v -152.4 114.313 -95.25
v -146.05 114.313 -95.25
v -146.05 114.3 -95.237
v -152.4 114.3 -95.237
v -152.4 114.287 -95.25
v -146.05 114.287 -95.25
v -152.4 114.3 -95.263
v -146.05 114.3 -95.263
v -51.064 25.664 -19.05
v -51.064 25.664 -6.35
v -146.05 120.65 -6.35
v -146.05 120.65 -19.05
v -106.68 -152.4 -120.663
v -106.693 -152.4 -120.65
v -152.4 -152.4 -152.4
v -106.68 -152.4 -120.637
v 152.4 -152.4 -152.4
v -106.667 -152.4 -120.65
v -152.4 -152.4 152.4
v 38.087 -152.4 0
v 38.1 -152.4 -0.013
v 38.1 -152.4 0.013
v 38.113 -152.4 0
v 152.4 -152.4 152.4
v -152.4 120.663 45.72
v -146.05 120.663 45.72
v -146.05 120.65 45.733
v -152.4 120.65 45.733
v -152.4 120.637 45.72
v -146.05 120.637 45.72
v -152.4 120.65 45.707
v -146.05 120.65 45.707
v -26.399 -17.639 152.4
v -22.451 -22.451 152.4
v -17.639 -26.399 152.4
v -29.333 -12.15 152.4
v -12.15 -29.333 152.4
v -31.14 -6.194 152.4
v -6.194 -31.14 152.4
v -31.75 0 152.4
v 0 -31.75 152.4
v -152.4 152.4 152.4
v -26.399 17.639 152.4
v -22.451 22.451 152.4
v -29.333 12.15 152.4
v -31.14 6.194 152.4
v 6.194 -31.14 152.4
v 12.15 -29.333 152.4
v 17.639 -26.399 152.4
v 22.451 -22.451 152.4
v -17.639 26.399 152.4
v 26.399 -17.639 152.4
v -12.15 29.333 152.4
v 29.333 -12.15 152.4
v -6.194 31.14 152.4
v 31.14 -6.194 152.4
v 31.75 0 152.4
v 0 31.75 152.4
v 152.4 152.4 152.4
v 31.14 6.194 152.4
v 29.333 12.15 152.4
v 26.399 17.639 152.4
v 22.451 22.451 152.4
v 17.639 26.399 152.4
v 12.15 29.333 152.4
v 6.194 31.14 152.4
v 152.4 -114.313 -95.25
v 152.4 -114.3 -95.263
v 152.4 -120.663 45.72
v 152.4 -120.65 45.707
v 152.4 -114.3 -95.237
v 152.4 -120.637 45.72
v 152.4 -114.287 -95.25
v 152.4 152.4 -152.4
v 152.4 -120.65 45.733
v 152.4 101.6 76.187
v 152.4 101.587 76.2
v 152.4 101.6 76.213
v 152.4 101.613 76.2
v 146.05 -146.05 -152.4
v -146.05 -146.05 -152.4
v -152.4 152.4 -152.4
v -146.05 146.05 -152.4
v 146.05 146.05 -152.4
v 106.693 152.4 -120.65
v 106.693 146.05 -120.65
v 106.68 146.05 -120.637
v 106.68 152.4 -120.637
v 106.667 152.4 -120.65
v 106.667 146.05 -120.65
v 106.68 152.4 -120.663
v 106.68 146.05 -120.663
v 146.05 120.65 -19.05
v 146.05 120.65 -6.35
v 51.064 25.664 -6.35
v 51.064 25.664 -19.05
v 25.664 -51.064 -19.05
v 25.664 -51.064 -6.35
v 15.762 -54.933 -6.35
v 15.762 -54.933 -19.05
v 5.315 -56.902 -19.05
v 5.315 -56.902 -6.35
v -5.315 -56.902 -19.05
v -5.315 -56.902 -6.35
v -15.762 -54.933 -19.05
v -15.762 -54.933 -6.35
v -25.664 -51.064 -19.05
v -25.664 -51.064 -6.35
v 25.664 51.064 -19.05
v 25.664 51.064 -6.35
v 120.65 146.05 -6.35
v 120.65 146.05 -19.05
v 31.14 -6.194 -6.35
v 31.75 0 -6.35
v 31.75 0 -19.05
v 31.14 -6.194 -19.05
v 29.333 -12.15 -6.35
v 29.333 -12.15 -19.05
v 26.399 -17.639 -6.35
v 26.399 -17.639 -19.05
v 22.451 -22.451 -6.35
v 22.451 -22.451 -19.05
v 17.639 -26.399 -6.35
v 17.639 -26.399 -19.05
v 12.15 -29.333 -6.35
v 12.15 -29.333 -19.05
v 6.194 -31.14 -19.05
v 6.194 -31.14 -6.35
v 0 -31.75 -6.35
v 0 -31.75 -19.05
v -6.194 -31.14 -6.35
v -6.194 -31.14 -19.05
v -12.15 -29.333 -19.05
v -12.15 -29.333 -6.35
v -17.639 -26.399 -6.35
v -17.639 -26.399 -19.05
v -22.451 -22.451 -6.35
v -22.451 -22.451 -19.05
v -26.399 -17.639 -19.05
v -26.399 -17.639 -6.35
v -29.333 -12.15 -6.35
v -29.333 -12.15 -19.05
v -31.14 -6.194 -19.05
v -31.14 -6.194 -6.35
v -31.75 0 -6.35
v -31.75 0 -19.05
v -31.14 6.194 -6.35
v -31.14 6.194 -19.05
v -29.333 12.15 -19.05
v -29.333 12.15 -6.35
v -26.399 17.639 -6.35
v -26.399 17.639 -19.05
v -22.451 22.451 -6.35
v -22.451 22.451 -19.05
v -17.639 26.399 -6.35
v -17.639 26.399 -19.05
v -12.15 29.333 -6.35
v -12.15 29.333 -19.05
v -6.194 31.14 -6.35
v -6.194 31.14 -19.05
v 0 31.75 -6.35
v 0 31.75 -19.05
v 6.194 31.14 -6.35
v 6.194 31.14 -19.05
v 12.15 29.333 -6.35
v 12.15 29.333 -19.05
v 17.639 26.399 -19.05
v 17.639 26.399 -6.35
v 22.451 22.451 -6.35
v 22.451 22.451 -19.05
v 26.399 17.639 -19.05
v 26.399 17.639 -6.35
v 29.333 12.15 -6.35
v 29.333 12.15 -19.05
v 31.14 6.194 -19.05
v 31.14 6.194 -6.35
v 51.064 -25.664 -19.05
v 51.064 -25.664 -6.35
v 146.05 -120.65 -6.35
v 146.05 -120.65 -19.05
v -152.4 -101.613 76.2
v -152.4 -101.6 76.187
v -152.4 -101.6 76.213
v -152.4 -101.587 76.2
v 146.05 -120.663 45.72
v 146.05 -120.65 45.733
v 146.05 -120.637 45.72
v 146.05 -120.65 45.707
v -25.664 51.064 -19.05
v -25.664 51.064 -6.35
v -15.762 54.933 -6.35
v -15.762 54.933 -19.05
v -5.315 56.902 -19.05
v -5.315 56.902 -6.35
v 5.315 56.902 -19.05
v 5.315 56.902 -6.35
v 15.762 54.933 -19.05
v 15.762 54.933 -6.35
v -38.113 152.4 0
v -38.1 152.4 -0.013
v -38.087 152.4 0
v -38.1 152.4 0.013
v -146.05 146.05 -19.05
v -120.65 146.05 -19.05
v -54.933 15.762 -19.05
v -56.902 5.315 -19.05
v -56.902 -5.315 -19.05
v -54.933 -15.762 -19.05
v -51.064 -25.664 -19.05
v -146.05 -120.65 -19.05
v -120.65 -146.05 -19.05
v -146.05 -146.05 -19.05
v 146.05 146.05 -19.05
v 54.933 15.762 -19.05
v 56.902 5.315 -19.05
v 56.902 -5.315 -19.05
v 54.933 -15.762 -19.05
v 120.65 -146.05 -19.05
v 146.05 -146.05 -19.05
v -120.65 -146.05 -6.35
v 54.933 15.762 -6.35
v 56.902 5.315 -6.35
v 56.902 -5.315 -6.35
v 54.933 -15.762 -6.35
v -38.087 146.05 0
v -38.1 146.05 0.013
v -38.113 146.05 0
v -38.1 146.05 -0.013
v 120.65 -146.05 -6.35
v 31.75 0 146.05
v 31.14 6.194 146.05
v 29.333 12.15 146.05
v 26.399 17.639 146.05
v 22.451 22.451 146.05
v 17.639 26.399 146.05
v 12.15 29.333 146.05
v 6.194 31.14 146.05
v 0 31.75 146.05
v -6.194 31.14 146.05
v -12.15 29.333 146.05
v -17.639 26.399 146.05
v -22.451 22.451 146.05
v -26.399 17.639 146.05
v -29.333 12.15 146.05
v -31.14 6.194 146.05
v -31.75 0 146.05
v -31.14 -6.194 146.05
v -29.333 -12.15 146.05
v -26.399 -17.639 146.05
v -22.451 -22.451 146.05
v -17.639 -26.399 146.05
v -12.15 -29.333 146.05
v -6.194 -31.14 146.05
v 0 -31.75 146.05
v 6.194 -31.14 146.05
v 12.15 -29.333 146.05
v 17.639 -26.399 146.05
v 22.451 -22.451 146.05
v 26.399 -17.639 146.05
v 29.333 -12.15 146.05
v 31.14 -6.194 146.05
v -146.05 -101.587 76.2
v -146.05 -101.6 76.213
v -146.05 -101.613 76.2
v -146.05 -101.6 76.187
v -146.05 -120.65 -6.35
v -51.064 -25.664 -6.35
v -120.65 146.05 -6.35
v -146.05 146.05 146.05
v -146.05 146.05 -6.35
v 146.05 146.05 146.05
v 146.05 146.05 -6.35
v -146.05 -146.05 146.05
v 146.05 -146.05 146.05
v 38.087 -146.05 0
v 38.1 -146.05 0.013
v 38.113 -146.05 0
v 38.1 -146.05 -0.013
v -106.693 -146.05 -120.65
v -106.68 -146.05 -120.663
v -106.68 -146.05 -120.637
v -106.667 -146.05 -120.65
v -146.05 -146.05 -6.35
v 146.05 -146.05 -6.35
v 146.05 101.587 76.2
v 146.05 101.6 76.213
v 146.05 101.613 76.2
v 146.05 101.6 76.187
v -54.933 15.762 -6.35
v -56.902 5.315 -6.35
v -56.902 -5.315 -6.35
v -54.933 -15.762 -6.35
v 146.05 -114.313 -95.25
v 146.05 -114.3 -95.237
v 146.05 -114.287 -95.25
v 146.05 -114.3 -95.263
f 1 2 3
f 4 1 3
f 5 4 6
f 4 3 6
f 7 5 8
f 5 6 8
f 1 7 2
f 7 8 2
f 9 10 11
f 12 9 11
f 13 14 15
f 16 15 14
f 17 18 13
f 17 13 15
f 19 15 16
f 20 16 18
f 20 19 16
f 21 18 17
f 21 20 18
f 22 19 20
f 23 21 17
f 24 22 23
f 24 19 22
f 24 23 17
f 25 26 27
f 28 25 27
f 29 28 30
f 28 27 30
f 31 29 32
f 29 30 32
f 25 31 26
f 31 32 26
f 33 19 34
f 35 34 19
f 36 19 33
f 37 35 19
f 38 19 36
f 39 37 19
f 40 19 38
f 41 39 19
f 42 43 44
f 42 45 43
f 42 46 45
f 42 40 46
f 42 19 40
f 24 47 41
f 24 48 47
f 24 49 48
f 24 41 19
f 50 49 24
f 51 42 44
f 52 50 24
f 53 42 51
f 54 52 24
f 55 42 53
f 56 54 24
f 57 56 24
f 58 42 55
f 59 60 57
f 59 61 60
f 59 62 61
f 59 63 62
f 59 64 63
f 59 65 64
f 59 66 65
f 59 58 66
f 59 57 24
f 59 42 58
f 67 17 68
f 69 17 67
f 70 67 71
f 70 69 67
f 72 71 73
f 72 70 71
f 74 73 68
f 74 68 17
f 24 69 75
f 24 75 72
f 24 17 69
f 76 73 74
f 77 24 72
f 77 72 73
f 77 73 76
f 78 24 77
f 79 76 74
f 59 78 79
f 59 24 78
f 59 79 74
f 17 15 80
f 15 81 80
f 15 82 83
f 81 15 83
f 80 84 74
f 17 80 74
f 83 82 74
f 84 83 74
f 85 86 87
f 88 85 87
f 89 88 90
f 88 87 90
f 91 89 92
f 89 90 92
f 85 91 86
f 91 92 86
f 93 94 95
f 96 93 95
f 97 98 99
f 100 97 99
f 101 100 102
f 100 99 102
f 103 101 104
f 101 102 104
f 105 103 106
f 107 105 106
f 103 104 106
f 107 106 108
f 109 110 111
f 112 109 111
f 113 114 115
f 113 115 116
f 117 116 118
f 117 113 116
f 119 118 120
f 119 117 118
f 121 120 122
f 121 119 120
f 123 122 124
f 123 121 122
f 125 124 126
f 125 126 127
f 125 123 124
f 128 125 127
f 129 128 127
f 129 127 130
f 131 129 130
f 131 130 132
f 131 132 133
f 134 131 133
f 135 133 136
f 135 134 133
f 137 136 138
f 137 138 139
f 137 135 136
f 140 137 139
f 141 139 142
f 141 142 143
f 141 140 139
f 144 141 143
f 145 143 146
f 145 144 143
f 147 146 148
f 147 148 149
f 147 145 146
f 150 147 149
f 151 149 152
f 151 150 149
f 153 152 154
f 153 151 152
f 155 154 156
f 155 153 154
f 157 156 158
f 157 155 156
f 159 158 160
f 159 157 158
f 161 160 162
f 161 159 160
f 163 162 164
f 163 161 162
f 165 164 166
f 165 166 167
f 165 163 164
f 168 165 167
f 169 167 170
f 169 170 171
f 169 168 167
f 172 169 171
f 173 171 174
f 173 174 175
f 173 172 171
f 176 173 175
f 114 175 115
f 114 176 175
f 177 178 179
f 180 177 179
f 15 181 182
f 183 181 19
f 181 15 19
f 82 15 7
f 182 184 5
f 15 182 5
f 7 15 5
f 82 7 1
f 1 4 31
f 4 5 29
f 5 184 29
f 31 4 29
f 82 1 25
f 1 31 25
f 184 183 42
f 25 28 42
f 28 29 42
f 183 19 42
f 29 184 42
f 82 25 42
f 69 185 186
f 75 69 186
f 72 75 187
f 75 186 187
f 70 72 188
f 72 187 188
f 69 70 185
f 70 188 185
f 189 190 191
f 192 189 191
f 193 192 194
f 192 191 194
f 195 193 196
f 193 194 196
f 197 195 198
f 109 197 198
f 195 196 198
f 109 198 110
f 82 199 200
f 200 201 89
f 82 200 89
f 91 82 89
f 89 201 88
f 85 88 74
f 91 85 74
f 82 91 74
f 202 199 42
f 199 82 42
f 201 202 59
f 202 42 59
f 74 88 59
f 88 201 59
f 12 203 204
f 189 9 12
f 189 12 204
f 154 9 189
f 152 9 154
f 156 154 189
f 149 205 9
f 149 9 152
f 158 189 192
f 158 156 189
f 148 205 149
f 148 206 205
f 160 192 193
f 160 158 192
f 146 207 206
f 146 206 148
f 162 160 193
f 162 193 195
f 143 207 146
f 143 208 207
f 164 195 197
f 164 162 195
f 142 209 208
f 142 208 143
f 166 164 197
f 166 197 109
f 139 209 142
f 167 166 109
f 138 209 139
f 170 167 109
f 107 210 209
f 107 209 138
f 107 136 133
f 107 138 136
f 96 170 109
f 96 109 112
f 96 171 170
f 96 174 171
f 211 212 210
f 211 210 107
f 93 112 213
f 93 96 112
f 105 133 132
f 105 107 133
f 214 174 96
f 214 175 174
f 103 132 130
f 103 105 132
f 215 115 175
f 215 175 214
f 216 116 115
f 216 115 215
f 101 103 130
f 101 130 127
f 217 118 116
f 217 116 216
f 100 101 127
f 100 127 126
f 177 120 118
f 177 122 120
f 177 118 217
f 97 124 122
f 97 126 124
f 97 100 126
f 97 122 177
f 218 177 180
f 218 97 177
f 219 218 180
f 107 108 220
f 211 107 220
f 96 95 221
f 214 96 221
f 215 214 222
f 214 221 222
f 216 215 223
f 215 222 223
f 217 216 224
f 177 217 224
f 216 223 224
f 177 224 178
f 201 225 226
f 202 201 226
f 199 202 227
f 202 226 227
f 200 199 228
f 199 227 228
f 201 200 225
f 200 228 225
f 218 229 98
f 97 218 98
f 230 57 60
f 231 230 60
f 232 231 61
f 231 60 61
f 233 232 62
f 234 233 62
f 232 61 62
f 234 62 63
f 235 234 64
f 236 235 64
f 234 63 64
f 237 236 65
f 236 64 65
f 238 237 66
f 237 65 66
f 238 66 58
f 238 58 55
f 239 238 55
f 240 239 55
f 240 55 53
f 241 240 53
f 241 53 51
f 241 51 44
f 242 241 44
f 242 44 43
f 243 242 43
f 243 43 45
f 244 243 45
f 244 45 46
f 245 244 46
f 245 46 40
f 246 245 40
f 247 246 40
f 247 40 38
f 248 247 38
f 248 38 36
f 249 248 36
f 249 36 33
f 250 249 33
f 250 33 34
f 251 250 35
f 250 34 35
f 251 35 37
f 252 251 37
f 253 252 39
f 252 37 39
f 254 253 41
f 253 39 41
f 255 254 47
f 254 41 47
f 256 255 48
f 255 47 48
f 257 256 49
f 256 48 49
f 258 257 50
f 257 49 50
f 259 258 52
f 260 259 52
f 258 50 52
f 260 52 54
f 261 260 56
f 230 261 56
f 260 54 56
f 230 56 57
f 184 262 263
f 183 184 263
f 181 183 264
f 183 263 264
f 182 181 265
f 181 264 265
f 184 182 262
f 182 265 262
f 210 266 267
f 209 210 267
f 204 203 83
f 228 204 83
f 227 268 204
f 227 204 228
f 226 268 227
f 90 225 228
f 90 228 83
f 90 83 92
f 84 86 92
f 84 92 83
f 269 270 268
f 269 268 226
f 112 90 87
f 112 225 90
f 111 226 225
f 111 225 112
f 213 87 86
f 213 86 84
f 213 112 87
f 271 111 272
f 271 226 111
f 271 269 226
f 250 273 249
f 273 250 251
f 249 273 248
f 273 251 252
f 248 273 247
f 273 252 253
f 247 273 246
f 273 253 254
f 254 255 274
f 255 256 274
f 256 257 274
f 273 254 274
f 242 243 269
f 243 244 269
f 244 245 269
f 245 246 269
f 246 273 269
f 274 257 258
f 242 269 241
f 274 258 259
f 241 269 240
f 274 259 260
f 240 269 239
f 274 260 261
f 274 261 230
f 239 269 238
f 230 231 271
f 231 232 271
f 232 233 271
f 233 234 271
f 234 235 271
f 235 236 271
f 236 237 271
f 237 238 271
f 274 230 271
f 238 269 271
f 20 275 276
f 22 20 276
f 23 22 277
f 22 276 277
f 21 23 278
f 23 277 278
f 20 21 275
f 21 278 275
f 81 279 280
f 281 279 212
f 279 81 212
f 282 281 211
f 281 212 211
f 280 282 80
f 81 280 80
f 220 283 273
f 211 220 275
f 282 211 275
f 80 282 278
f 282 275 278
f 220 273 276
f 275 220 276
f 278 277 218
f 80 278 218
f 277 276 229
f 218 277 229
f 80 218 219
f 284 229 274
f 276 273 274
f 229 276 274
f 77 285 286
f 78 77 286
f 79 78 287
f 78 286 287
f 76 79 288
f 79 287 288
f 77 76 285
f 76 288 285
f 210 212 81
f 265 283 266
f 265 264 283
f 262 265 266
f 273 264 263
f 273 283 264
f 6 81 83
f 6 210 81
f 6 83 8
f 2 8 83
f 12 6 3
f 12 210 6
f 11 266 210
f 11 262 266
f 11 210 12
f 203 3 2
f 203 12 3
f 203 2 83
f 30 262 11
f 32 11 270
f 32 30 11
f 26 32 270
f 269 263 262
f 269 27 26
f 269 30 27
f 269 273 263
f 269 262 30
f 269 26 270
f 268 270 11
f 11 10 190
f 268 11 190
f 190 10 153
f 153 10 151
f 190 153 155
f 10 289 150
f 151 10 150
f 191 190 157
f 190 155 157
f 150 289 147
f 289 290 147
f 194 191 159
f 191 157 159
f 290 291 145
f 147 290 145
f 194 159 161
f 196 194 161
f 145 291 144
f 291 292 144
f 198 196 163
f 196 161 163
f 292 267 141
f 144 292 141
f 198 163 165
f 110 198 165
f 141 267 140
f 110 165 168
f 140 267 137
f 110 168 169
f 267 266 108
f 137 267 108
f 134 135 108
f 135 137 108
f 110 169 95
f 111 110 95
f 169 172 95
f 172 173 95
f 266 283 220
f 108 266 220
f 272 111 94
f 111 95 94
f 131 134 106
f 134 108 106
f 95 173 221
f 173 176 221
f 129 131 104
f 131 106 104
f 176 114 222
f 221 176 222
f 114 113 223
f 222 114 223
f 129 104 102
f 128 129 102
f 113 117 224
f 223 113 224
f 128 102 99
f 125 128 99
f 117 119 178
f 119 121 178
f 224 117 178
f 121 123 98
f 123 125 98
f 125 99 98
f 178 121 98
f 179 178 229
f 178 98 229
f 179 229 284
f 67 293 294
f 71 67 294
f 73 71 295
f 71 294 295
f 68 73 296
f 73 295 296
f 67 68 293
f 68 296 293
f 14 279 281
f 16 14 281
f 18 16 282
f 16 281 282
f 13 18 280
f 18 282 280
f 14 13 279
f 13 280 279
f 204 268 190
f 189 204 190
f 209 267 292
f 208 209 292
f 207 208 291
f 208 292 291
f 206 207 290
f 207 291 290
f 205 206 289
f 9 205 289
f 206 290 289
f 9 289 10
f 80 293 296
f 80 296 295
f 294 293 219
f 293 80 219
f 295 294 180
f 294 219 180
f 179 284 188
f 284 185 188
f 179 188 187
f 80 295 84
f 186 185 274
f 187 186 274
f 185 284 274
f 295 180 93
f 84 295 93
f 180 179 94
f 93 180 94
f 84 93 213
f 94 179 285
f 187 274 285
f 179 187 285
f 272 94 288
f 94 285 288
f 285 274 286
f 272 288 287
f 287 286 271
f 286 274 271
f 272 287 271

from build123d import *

# Parameters (mm, degrees)
F0_W      = 304.8
F0_H      = 304.8
F0_W_2    = 292.1
F0_H_2    = 292.1
F1_DEPTH  = 152.4
F2_W      = 304.8
F2_H      = 304.8
F3_DEPTH  = 6.35
F5_D      = 0.0254
F5_DEPTH  = 12.7
F6_D      = 0.0254
F6_DEPTH  = 12.7
F8_D      = 0.0254
F8_DEPTH  = 12.7
F9_D      = 0.0254
F9_DEPTH  = 12.7
F12_D     = 0.0254
F12_DEPTH = 12.7
F13_D     = 0.0254
F13_DEPTH = 12.7
F14_D     = 0.0254
F14_DEPTH = 12.7
F15_D     = 0.0254
F15_DEPTH = 12.7
F16_D     = 0.0254
F16_DEPTH = 12.7
F17_D     = 0.0254
F17_DEPTH = 12.7
F19_R     = 31.75
F20_DEPTH = 12.7
F21_R     = 31.75
F22_DEPTH = 25.4


with BuildPart() as f1:
    # F0 (on Top) → F1 (new body, symmetric)
    with BuildSketch(Plane.XY):
        Rectangle(F0_W, F0_H)
        Rectangle(F0_W_2, F0_H_2, mode=Mode.SUBTRACT)
    extrude(amount=F1_DEPTH, both=True)

    # F2 (on face) → F3 (join)
    with BuildSketch(Plane.XY.offset(152.4)):
        Rectangle(F2_W, F2_H)
    extrude(amount=-F3_DEPTH)

    # F5
    with Locations(Plane(origin=(0, 152.4, 0), x_dir=(-1, 0, 0), z_dir=(0, 1, 0))):
        with Locations((38.1, 0)):
            Hole(F5_D / 2, depth=F5_DEPTH)

    # F6
    with Locations(Plane(origin=(0, 152.4, 0), x_dir=(-1, 0, 0), z_dir=(0, 1, 0))):
        with Locations((-106.68, -120.65)):
            Hole(F6_D / 2, depth=F6_DEPTH)

    # F8
    with Locations(Plane.XZ.offset(152.4)):
        with Locations((-106.68, -120.65)):
            Hole(F8_D / 2, depth=F8_DEPTH)

    # F9
    with Locations(Plane.XZ.offset(152.4)):
        with Locations((38.1, 0)):
            Hole(F9_D / 2, depth=F9_DEPTH)

    # F12
    with Locations(Plane.YZ.offset(152.4)):
        with Locations((-114.3, -95.25)):
            Hole(F12_D / 2, depth=F12_DEPTH)

    # F13
    with Locations(Plane.YZ.offset(152.4)):
        with Locations((-120.65, 45.72)):
            Hole(F13_D / 2, depth=F13_DEPTH)

    # F14
    with Locations(Plane(origin=(-152.4, 0, 0), x_dir=(0, -1, 0), z_dir=(-1, 0, 0))):
        with Locations((-114.3, -95.25)):
            Hole(F14_D / 2, depth=F14_DEPTH)

    # F15
    with Locations(Plane(origin=(-152.4, 0, 0), x_dir=(0, -1, 0), z_dir=(-1, 0, 0))):
        with Locations((-120.65, 45.72)):
            Hole(F15_D / 2, depth=F15_DEPTH)

    # F16
    with Locations(Plane(origin=(-152.4, 0, 0), x_dir=(0, -1, 0), z_dir=(-1, 0, 0))):
        with Locations((101.6, 76.2)):
            Hole(F16_D / 2, depth=F16_DEPTH)

    # F17
    with Locations(Plane.YZ.offset(152.4)):
        with Locations((101.6, 76.2)):
            Hole(F17_D / 2, depth=F17_DEPTH)

    # F19 (on offset) → F20 (join)
    with BuildSketch(Plane(origin=(0, 0, -6.35), x_dir=(1, 0, 0), z_dir=(0, 0, -1))):
        with BuildLine():
            Line((120.65, -146.05), (146.05, -146.05))
            Line((146.05, -146.05), (146.05, -120.65))
            Line((146.05, -120.65), (51.063671, -25.663671))
            ThreePointArc((51.063671, -25.663671), (57.15, 0), (51.063671, 25.663671))
            Line((51.063671, 25.663671), (146.05, 120.65))
            Line((146.05, 120.65), (146.05, 146.05))
            Line((146.05, 146.05), (120.65, 146.05))
            Line((120.65, 146.05), (25.663671, 51.063671))
            ThreePointArc((25.663671, 51.063671), (0, 57.15), (-25.663671, 51.063671))
            Line((-25.663671, 51.063671), (-120.65, 146.05))
            Line((-120.65, 146.05), (-146.05, 146.05))
            Line((-146.05, 146.05), (-146.05, 120.65))
            Line((-146.05, 120.65), (-51.063671, 25.663671))
            ThreePointArc((-51.063671, 25.663671), (-57.15, 0), (-51.063671, -25.663671))
            Line((-51.063671, -25.663671), (-146.05, -120.65))
            Line((-146.05, -120.65), (-146.05, -146.05))
            Line((-146.05, -146.05), (-120.65, -146.05))
            Line((-120.65, -146.05), (-25.663671, -51.063671))
            ThreePointArc((-25.663671, -51.063671), (0, -57.15), (25.663671, -51.063671))
            Line((25.663671, -51.063671), (120.65, -146.05))
        make_face()
        Circle(F19_R, mode=Mode.SUBTRACT)
    extrude(amount=F20_DEPTH)

    # F21 (on face) → F22 (cut)
    with BuildSketch(Plane.XY.offset(152.4)):
        Circle(F21_R)
    extrude(amount=-F22_DEPTH, mode=Mode.SUBTRACT)


solid = f1.part
